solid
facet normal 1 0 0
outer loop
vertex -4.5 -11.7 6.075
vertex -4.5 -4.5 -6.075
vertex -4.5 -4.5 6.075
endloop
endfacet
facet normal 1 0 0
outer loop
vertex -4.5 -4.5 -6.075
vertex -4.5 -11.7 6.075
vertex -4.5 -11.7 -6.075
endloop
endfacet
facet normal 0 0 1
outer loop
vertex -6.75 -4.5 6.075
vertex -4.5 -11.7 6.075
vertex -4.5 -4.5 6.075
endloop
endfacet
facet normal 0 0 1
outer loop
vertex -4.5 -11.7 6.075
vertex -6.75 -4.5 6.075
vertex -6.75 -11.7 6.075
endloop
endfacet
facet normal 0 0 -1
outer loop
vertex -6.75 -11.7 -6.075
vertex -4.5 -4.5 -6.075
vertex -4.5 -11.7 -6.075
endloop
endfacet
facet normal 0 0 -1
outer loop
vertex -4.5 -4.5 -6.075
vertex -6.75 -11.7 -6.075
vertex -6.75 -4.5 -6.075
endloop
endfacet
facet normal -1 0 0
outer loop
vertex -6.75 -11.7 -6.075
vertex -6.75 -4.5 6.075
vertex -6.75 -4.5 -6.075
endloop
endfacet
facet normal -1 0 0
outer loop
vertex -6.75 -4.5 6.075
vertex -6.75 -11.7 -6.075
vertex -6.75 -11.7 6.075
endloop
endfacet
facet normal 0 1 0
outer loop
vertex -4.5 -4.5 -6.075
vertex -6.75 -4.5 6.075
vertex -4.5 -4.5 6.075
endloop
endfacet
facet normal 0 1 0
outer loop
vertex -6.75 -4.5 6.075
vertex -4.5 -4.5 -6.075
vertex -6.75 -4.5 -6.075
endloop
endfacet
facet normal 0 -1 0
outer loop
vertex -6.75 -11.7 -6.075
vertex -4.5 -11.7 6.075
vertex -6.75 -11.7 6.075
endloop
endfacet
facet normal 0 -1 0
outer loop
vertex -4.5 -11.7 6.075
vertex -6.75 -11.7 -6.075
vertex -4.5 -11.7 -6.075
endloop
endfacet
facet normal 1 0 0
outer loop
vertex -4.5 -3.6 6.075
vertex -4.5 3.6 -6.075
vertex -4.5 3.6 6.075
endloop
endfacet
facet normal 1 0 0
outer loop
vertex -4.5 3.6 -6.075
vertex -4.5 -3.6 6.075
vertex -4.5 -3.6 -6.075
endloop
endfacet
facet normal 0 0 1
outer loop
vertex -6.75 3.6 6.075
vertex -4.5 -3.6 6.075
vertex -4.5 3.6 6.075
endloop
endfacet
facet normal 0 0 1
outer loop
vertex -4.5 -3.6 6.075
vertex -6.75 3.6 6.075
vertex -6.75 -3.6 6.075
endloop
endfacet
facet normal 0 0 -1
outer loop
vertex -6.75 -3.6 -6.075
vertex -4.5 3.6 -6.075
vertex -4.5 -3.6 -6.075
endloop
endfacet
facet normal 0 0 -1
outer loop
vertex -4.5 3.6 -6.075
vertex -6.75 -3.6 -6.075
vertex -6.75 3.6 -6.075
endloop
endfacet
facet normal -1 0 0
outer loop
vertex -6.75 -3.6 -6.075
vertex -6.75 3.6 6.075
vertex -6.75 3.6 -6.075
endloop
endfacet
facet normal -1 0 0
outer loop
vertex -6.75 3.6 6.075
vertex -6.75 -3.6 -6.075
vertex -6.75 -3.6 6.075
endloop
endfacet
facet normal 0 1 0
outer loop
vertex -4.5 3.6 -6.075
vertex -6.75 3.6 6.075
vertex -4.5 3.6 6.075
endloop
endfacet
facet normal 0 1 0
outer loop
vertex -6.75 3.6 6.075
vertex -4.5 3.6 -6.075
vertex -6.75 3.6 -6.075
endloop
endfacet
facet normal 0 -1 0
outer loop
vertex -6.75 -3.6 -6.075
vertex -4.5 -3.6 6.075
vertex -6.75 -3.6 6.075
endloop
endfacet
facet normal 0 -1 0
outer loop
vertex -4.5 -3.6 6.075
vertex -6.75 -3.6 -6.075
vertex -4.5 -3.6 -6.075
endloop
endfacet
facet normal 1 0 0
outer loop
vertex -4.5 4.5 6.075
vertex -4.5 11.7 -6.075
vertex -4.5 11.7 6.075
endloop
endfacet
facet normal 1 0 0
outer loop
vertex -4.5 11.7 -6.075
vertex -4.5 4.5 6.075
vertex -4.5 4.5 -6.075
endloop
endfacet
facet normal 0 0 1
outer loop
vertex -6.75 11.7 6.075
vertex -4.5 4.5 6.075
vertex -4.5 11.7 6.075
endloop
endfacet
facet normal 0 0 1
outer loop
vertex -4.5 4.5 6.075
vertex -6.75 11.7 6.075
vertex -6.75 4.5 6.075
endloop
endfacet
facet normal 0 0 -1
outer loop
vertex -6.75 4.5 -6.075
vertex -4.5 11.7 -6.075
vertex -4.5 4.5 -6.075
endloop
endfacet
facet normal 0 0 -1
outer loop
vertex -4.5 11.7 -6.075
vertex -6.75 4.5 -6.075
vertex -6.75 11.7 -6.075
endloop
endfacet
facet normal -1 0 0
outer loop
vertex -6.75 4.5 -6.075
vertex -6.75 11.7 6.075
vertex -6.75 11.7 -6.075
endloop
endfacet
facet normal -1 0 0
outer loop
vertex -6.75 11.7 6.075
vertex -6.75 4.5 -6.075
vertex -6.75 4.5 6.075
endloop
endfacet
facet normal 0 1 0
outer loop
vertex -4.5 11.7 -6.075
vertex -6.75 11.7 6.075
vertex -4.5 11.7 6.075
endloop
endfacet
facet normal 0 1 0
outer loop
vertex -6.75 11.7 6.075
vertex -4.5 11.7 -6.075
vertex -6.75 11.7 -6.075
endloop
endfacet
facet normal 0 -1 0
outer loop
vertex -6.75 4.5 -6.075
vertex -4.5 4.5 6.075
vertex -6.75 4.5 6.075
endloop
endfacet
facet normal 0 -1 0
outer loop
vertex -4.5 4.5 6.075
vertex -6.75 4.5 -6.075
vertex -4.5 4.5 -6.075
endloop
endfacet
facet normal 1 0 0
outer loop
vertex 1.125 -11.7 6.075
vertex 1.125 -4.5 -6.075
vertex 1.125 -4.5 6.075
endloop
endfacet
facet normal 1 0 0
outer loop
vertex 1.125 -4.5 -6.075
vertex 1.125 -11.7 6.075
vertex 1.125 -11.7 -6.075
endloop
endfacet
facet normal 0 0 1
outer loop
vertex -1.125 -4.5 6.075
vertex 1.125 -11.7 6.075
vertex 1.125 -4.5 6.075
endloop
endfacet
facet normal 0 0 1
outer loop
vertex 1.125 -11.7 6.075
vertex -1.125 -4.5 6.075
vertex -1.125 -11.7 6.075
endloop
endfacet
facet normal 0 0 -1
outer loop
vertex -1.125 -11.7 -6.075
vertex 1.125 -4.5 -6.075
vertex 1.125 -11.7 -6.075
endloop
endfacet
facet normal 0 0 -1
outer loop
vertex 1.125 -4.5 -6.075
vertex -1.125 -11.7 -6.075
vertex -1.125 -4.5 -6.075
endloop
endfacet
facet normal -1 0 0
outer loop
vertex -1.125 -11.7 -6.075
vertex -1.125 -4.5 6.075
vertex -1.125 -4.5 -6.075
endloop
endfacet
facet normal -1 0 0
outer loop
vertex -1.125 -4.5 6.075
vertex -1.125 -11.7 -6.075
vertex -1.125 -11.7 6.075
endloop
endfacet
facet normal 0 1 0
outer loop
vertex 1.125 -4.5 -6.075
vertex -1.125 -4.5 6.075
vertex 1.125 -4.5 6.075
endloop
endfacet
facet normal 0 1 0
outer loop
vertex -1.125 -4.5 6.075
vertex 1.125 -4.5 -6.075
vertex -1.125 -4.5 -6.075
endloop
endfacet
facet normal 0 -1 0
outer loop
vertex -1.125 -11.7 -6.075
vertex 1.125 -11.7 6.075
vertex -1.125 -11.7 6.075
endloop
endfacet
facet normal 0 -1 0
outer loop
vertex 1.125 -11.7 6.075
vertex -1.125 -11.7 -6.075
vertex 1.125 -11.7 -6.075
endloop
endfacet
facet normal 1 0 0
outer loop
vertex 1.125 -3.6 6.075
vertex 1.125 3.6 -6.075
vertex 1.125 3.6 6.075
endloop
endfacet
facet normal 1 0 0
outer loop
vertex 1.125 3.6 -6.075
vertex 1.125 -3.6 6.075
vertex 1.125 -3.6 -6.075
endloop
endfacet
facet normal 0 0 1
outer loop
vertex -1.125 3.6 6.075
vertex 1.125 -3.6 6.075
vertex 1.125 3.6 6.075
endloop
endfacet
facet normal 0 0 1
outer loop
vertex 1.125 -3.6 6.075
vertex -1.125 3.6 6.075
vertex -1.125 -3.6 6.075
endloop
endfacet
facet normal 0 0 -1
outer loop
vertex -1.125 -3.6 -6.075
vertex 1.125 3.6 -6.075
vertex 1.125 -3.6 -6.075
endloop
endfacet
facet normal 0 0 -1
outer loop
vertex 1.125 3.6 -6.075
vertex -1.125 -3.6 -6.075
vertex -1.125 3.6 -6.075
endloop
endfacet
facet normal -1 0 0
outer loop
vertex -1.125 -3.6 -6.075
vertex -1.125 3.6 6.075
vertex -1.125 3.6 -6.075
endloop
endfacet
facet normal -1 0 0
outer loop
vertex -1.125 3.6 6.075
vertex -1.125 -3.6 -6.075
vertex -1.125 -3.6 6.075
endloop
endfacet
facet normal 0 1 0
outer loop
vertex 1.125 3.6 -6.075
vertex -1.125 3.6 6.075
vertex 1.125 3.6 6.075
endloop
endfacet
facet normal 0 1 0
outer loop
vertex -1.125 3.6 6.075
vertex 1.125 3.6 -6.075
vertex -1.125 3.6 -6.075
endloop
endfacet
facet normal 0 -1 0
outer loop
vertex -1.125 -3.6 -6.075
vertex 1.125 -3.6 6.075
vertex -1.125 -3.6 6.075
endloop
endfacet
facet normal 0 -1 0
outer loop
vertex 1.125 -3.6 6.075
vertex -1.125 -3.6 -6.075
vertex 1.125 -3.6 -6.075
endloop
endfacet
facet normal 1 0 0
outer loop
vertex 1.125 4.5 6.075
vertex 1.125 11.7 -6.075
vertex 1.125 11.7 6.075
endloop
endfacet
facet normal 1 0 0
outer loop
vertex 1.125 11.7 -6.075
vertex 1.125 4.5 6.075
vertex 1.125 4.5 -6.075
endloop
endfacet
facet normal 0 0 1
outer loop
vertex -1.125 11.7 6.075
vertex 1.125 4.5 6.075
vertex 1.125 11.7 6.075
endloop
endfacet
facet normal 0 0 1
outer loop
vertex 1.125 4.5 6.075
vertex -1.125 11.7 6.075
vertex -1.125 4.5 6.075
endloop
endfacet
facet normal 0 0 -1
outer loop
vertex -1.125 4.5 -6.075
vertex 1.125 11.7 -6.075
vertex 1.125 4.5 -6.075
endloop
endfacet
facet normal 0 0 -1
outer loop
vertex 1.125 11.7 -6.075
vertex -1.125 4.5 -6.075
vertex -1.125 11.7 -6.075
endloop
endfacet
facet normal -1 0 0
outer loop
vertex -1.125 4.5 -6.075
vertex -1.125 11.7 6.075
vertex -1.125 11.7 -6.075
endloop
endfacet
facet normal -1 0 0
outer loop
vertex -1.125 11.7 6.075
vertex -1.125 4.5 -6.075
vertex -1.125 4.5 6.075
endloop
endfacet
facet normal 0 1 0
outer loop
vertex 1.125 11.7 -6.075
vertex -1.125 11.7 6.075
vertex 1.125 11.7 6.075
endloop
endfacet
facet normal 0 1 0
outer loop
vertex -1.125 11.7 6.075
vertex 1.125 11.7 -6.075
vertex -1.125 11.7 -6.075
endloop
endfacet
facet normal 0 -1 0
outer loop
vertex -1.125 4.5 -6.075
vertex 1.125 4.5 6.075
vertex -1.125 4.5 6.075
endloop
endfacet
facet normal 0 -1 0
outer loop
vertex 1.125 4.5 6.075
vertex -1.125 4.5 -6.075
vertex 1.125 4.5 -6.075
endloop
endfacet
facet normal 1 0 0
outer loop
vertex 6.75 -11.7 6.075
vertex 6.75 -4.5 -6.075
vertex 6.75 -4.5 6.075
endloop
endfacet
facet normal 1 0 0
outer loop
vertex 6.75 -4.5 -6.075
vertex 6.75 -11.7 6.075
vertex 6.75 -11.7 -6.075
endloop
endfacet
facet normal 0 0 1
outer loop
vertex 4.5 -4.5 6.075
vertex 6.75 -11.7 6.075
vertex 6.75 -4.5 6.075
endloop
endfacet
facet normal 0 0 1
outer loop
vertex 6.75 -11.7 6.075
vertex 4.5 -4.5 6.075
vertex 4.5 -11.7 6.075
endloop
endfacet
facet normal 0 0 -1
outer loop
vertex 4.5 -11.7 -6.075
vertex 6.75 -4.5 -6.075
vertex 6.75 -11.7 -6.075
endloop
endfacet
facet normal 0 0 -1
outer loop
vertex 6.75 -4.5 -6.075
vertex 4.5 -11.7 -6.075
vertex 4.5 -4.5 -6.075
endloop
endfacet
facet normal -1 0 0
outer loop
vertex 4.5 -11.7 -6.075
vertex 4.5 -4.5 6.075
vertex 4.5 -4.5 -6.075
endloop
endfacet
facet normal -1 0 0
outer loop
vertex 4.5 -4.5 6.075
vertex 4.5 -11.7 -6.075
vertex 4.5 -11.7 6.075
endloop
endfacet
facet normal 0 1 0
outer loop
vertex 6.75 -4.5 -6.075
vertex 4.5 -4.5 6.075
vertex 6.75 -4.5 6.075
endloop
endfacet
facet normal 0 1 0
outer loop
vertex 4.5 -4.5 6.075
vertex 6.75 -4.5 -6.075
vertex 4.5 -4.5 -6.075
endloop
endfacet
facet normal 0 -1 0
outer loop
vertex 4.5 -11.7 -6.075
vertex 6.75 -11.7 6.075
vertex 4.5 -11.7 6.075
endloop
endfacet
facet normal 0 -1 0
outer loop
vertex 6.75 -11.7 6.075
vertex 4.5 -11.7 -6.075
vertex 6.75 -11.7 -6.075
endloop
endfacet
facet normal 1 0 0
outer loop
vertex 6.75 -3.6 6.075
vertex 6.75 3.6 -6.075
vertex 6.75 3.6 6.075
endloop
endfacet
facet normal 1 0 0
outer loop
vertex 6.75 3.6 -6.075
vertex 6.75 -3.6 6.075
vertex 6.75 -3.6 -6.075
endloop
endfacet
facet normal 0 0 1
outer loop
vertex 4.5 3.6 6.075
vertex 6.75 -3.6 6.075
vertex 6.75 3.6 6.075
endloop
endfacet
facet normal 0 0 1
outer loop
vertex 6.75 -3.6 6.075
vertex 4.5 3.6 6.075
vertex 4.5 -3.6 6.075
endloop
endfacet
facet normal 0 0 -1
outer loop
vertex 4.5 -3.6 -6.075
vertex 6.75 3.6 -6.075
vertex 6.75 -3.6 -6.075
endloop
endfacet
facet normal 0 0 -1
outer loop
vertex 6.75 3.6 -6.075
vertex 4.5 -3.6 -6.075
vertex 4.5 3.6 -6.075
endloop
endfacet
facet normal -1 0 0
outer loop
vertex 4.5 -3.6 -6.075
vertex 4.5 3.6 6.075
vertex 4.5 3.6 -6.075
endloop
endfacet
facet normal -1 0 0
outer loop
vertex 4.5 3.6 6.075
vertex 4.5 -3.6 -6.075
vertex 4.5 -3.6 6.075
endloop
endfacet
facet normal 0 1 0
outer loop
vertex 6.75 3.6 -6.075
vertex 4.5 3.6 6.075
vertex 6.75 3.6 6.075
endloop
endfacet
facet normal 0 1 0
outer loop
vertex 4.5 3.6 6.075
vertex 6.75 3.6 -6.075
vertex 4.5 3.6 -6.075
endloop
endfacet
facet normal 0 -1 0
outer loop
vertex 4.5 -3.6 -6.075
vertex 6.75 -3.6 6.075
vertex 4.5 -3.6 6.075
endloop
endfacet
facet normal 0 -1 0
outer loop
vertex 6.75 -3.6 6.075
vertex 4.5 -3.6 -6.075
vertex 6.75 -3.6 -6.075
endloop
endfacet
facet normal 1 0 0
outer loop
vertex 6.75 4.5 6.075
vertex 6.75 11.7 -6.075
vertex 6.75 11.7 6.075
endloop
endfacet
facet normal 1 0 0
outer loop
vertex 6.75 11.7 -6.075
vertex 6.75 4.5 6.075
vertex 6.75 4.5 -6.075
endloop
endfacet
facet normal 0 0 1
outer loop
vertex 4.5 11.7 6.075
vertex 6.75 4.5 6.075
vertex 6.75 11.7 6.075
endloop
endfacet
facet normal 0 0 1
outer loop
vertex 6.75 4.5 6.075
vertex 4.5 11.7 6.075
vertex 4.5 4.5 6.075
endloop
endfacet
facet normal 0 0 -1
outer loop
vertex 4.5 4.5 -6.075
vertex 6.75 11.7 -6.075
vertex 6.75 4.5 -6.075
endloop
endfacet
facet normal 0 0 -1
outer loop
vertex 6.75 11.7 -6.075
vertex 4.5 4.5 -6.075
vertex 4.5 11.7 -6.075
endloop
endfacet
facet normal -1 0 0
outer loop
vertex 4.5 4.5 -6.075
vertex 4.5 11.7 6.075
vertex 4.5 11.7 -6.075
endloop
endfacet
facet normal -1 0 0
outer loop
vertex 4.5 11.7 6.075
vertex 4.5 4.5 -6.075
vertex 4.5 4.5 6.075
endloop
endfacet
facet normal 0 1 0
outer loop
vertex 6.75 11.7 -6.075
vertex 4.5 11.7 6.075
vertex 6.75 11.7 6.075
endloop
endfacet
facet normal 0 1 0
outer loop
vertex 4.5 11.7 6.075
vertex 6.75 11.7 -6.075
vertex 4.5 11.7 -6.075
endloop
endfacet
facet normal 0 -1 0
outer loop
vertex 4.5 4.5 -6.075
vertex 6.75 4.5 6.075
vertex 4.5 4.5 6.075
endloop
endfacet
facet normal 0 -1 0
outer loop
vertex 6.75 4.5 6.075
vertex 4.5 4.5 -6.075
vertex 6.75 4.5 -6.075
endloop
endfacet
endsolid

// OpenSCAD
// file: pin.scad
include <globals.scad>;

module pin()
{
    //# Space of 2 middle, 1
    //# 1 of each sde
    //# Total width = 4
    // # total height is bottom tabs (2) plus projection of 10 = 12
    difference()
    {
        union()
        {
            cube([pin_x, pin_y-(unit*2), pin_z], center=true);
            translate([0,0,-pin_z/2+unit/2]) // to bottom
            translate([0,0,1]) // up by 1
            cube([unit, pin_y, unit], center=true);
        }
        translate([0,0,unit ]) cube([unit*2, space+unit+space, pin_z], center=true);
    }
}


module pinHole()
{

    cube([hole_x, hole_y, hole_z], center=true);
}


pin();
//#pinHole();
// file: globals.scad
//based around 0.4 nozzle width
// block = 
unit = 0.45*2;
space = (unit/2)*1.5;

pin_x = unit * 1;
        // tab + spoke + space + rack + space + spoke + tab
pin_y = unit + unit + space + unit + space + unit + unit; 
pin_z = unit * 12;

hole_x = pin_x + (space*2); // 1 + 0.8 each side
hole_y = pin_y + (space*2); // 6 + 0.8 each side
hole_z = pin_z + (space*2); // 12 + 0.75 

slidesSection_x = unit+hole_x+unit;
slidesSection_y = unit+hole_y+unit;
slidesSection_z = unit;

boarder = 20;

x_hole_spacing = slidesSection_x + space + unit ;
// main file
include <globals.scad>;

use <pin.scad>;

module yHoles(n_y=3)
{
    for(s_y = [0 : n_y-1])
    {
        //# -1 as we want overlap to make as thin as possible
        translate([0, -(n_y-1)*(slidesSection_y-unit)/2,0])
        translate([0, s_y*(slidesSection_y-unit),0])
        pinHole();
    }
}

module gridHoles(n_x=3,n_y=3)
{
    for(s_x = [0 : n_x-1])
    {
        translate([-(n_x-1)*(x_hole_spacing)/2,0,0])
        translate([s_x*(x_hole_spacing),0,0])
        yHoles(n_y=3);

        translate([-(n_x-1)*(x_hole_spacing)/2,0,0])
        translate([s_x*(x_hole_spacing),0,0]);

    }    
}

//yHoles(n_y=3);
gridHoles(n_x=3,n_y=3);
